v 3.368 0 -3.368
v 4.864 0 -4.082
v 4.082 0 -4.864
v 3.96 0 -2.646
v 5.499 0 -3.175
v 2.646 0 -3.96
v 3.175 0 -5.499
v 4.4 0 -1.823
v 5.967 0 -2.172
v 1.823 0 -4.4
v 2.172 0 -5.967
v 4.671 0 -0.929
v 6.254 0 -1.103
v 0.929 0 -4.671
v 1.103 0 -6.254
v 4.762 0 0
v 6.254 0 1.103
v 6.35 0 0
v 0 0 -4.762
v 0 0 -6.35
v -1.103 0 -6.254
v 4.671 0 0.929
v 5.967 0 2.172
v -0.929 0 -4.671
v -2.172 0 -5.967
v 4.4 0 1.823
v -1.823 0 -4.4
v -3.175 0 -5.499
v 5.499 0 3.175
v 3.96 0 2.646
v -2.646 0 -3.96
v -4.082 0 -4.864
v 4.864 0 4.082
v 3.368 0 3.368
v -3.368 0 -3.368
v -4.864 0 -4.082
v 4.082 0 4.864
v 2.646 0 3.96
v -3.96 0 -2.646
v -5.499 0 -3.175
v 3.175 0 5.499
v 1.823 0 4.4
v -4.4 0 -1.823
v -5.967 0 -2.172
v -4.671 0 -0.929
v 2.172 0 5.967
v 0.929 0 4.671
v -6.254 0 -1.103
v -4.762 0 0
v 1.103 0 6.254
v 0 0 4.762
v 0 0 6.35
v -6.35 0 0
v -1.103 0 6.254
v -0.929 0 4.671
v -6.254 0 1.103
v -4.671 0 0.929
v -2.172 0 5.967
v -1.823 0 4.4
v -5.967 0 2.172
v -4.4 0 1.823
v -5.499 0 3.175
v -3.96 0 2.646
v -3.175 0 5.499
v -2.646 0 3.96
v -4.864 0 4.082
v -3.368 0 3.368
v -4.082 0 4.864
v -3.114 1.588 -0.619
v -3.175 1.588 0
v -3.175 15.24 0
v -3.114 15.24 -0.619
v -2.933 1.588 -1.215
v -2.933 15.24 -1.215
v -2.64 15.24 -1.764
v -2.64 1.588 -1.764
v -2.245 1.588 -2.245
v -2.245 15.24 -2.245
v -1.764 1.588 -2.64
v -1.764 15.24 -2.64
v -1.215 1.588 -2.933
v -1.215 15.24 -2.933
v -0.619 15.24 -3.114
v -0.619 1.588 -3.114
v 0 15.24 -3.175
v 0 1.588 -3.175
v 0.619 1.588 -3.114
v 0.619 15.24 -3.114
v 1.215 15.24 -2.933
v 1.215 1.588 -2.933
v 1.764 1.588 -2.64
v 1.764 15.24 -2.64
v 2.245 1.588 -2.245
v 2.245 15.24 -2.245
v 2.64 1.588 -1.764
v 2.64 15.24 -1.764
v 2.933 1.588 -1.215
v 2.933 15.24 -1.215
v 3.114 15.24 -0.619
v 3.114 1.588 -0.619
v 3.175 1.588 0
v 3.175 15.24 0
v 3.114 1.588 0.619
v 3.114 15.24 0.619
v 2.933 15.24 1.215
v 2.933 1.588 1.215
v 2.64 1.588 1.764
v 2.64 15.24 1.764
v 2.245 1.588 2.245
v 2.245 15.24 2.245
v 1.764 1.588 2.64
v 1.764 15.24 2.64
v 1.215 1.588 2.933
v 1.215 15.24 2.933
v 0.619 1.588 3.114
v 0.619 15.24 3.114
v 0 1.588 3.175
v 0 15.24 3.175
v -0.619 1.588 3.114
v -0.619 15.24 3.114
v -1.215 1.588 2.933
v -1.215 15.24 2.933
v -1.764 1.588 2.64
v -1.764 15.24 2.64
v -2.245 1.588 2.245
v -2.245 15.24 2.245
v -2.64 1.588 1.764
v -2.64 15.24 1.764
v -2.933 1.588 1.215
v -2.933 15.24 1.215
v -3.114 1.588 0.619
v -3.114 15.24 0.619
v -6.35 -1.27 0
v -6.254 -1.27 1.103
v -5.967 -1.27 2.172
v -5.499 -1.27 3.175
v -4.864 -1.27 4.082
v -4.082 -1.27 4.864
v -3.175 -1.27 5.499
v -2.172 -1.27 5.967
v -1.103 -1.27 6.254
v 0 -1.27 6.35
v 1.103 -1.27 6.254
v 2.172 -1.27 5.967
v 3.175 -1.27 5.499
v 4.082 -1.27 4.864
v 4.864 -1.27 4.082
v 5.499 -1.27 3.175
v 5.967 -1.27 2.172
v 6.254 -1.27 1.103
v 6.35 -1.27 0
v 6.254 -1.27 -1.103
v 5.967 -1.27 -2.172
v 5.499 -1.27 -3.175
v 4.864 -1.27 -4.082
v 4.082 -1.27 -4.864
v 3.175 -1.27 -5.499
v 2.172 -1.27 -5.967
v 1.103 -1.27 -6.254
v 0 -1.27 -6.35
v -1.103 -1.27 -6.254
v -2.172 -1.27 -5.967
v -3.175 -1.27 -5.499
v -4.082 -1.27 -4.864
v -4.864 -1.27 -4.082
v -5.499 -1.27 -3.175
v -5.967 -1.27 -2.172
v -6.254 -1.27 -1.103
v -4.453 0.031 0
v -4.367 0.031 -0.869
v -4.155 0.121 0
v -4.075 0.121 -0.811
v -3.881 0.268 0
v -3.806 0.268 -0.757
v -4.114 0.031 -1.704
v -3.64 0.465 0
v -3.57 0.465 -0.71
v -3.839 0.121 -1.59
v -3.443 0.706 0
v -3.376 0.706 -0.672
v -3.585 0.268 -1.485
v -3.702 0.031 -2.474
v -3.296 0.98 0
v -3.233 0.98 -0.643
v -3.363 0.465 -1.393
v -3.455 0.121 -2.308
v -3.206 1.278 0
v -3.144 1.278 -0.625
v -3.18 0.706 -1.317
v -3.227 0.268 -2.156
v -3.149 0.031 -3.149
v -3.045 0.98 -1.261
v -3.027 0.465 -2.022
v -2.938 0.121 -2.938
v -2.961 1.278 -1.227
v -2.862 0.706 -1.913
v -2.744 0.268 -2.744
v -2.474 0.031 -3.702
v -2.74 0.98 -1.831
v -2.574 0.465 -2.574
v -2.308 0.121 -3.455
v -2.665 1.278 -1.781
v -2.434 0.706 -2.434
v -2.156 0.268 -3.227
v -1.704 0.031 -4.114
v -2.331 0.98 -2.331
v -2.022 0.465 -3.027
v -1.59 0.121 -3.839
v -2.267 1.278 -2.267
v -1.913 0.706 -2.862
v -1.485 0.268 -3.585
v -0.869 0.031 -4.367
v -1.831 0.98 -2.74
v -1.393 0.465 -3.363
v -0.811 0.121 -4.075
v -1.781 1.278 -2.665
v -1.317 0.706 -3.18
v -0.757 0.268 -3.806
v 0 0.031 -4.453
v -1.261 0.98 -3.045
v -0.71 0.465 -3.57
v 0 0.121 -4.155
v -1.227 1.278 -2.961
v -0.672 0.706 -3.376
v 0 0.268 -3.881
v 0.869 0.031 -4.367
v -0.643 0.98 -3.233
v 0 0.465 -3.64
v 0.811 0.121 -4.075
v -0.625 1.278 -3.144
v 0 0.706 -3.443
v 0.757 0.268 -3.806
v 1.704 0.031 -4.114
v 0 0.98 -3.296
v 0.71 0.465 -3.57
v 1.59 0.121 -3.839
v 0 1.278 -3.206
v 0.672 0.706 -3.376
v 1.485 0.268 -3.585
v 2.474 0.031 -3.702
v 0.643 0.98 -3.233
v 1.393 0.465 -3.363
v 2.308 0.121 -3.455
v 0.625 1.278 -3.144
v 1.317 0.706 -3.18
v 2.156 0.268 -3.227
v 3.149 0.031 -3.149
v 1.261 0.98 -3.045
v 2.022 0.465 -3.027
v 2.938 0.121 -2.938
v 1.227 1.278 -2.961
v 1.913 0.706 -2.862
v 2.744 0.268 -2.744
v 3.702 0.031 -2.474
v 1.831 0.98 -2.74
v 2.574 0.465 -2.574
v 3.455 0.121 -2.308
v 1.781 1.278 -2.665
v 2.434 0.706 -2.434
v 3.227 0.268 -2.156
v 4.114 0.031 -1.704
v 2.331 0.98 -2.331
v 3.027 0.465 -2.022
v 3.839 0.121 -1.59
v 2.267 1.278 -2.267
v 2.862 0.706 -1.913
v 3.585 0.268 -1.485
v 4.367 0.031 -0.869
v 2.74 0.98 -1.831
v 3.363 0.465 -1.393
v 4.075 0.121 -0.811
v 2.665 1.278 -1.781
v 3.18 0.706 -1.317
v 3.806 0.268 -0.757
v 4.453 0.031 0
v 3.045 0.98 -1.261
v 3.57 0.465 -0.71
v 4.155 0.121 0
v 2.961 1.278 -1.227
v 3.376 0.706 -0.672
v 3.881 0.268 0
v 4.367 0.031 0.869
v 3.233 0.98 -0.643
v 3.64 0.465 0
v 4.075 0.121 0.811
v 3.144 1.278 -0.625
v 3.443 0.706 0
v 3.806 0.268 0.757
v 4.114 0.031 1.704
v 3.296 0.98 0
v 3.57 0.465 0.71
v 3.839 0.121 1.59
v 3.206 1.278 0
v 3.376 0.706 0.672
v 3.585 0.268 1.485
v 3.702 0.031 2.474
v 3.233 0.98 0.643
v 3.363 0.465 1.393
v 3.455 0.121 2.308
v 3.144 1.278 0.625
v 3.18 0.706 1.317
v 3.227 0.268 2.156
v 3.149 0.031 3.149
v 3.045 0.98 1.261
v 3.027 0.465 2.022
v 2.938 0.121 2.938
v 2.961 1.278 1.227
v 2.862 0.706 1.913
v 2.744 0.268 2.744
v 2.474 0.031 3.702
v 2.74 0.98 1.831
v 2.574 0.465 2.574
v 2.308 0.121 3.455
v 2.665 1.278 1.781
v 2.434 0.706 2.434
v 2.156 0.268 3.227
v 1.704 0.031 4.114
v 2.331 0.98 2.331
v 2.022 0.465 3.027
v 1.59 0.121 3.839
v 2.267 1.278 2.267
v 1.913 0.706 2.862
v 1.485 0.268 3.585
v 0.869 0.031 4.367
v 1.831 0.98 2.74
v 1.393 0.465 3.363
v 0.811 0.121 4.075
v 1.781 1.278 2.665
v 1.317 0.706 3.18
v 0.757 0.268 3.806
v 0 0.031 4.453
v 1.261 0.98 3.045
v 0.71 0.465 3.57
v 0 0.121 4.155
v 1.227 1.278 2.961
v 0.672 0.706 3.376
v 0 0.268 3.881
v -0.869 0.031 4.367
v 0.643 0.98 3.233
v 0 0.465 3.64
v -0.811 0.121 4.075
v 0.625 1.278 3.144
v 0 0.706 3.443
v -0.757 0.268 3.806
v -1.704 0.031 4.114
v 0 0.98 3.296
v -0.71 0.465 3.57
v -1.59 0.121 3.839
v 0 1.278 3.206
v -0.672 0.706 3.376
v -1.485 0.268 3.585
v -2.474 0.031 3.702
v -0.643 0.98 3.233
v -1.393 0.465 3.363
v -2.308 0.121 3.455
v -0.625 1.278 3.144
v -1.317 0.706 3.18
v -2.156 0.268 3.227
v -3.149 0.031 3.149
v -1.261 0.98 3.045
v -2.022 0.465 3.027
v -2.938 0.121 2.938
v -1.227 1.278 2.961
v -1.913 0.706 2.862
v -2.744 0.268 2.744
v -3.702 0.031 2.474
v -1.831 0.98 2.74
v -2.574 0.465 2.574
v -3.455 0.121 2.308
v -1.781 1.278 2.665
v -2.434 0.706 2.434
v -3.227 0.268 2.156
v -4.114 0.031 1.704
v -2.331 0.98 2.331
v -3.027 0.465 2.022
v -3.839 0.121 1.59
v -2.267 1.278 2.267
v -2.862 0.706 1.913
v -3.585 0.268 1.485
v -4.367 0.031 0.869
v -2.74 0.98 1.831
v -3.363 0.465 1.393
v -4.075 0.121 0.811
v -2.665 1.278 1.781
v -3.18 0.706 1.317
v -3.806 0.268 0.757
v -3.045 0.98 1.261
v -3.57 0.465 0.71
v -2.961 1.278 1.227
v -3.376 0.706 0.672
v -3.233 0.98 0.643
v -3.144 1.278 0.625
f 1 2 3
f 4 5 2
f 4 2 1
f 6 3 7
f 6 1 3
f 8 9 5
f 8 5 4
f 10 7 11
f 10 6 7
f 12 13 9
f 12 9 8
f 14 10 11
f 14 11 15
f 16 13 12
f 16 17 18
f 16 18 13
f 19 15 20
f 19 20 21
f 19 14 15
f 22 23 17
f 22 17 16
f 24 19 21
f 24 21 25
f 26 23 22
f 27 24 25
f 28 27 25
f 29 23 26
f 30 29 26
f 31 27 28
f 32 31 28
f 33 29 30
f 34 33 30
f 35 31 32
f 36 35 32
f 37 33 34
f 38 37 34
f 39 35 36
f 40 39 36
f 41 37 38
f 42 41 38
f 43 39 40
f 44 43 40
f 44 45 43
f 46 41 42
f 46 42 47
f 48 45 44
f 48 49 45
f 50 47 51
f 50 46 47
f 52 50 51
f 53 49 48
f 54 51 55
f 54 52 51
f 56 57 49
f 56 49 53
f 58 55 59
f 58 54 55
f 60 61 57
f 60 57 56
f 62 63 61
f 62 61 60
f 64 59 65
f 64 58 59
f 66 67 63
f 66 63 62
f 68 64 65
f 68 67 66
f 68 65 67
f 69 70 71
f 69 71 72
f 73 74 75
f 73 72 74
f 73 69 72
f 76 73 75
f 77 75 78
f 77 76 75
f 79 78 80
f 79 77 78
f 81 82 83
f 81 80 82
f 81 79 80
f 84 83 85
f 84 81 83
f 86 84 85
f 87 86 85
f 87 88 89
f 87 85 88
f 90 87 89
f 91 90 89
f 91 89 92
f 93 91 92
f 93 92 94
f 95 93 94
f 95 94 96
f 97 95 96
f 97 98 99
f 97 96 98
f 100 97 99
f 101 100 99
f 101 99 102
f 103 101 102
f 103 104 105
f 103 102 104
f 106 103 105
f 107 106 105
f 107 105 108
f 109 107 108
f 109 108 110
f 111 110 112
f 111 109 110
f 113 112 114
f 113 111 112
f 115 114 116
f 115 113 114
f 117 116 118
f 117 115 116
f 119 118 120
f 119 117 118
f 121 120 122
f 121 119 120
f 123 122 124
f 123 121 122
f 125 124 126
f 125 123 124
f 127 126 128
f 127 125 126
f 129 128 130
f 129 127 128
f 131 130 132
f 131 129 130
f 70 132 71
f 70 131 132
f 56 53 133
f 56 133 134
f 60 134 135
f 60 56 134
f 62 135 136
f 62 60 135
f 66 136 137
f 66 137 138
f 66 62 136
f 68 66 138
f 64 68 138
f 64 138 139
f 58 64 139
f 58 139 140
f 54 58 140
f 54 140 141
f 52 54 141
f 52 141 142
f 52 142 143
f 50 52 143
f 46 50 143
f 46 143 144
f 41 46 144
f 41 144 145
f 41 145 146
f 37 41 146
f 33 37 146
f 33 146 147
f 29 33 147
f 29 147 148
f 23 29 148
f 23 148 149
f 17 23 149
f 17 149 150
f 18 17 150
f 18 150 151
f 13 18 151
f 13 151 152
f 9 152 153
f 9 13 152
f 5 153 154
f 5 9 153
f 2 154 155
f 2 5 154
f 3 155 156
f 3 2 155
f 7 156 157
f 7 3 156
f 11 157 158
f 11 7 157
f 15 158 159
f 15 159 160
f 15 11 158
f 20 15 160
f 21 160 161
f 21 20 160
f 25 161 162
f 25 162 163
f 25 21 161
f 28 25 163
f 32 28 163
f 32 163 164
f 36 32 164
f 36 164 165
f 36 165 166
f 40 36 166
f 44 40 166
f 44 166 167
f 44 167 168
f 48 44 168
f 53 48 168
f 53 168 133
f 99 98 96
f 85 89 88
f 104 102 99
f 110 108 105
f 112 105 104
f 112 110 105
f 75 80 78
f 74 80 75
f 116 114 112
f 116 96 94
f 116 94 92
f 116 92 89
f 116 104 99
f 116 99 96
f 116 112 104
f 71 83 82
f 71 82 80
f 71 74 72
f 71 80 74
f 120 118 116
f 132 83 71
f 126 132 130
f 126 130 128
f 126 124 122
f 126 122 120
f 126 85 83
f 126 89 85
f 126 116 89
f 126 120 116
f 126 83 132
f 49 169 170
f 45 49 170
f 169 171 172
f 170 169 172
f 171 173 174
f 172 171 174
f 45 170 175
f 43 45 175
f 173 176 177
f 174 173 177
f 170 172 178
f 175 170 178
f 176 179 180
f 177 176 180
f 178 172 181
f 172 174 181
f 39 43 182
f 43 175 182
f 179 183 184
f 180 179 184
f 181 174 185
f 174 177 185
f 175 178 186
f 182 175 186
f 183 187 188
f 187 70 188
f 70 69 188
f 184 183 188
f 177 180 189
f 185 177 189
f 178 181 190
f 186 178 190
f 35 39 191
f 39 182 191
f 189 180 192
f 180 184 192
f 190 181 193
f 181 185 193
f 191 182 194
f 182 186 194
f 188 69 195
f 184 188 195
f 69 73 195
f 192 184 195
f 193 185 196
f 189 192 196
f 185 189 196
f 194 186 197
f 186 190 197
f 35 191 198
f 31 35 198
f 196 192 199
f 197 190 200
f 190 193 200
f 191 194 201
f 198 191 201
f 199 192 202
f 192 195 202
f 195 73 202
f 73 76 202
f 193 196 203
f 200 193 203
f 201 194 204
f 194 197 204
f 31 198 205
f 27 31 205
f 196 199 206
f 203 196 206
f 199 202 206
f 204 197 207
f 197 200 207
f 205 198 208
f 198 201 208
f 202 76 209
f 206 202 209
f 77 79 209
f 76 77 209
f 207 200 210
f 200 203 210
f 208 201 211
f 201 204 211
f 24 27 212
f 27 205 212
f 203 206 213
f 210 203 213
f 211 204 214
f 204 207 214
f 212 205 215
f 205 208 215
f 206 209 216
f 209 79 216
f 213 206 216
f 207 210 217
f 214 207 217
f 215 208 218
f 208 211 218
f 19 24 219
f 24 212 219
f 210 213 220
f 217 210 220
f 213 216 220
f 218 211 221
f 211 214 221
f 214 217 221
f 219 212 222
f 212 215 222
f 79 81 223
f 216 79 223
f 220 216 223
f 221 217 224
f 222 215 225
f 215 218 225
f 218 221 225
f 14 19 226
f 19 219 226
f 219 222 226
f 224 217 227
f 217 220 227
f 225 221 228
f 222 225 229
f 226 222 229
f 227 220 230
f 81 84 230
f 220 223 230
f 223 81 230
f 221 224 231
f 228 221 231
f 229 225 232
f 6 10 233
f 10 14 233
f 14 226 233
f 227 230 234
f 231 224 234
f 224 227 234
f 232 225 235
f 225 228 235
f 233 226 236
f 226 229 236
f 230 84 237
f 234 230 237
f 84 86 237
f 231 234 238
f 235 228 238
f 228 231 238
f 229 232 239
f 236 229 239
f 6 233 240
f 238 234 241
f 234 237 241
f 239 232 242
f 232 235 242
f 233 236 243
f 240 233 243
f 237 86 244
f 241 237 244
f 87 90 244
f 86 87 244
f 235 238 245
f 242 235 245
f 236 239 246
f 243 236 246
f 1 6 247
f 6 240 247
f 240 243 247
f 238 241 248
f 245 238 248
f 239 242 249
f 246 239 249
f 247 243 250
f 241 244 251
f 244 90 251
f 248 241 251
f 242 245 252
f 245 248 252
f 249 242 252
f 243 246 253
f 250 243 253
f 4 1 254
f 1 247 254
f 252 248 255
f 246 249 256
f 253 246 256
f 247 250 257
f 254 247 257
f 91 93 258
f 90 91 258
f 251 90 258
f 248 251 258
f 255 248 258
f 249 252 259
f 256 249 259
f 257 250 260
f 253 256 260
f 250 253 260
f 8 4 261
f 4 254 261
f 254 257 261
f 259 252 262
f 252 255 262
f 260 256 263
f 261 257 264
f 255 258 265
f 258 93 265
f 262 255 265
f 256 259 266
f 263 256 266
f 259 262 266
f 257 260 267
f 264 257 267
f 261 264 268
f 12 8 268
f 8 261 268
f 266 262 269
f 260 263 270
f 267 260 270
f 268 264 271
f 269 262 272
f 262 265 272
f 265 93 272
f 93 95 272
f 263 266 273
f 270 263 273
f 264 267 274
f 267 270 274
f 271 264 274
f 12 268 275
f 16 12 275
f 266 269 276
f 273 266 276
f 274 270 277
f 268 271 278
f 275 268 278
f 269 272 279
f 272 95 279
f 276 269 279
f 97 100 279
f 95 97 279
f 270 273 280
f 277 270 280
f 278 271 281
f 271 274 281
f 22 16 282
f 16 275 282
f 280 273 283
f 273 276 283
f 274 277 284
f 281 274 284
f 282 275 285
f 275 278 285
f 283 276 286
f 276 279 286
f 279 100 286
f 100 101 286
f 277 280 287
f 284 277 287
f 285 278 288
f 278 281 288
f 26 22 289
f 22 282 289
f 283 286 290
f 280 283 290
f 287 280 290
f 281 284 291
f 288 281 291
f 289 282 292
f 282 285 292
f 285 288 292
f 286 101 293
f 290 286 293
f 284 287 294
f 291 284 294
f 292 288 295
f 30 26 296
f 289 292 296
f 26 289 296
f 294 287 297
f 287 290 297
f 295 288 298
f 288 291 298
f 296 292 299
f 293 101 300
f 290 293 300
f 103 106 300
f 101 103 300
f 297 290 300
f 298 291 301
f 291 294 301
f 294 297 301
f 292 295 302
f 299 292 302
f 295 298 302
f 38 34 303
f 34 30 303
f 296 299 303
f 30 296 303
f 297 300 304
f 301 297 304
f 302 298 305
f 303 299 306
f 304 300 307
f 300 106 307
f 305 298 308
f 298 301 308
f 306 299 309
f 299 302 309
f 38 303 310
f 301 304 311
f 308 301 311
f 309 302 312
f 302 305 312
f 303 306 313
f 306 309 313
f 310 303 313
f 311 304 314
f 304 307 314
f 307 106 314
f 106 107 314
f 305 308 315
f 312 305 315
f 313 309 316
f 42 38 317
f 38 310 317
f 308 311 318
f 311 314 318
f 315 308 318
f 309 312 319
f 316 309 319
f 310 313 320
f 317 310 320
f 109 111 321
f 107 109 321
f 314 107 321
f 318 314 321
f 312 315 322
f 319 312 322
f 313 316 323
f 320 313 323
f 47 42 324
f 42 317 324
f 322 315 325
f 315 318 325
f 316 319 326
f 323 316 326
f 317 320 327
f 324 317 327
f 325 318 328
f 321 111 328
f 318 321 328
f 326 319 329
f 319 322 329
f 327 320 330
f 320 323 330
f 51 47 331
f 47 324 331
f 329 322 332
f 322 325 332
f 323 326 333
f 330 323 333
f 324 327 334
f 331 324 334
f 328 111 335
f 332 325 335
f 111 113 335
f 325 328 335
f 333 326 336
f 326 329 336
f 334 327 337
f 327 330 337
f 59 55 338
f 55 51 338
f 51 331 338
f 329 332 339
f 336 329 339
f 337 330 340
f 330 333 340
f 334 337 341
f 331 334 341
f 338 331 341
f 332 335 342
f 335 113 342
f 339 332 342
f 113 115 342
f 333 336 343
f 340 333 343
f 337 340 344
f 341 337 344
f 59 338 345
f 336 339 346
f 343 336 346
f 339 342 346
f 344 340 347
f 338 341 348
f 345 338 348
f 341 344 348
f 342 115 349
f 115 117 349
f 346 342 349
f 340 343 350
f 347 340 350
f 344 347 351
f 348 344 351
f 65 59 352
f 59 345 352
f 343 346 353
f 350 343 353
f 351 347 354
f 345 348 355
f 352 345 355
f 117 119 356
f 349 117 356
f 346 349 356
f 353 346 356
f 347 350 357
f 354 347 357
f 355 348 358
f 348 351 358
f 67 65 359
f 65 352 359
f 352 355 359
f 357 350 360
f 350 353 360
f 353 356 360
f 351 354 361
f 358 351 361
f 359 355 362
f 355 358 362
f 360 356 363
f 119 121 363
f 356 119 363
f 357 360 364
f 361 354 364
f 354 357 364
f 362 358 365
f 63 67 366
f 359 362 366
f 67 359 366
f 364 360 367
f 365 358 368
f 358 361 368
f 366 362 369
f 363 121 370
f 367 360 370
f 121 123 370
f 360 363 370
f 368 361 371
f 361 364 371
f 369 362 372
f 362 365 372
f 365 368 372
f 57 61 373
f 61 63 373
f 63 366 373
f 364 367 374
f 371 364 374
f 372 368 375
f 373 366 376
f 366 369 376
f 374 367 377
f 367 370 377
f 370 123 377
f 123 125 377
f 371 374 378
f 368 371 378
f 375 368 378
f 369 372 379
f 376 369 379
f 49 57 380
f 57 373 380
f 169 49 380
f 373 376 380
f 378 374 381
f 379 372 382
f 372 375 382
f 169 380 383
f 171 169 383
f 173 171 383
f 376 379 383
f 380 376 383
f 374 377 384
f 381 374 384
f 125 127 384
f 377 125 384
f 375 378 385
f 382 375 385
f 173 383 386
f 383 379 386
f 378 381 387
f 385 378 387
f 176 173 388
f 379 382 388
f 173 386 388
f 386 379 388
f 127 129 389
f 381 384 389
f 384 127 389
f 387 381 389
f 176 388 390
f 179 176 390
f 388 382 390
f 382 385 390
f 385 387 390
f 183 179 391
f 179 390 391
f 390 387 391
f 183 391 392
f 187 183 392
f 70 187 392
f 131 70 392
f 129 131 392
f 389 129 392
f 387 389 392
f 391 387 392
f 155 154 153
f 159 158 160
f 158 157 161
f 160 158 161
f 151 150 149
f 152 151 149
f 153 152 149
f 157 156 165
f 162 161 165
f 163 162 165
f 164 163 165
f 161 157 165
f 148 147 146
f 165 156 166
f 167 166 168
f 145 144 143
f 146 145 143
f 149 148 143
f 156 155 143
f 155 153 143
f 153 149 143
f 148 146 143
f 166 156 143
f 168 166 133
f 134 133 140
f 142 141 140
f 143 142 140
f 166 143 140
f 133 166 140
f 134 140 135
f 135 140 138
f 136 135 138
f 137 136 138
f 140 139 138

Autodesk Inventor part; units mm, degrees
ref_plane "YZ Plane" through (0, 0, 0) normal (1, 0, 0) x (0, 1, 0)
ref_plane "XZ Plane" through (0, 0, 0) normal (0, 1, 0) x (-1, 0, 0)
ref_plane "XY Plane" through (0, 0, 0) normal (0, 0, 1) x (1, 0, 0)
sketch "Sketch1" plane through (0, 0, 0) normal (0, 1, 0) x (-1, 0, 0)
  circle A0 centre (0, 0) radius 6.35
  circle A1 centre (0, 0) radius 3.175
  dimension "d0" = 12.7
  dimension "d1" = 6.35
extrude "Extrusion1" add sketch "Sketch1" along normal blind 15.24 contours A1
extrude "Extrusion2" add sketch "Sketch1" against normal blind 1.27 contours A0 | A1
fillet "Fillet1" radius 1.5875 1 edges at (3.175, 0, 0)
properties part number "Pin_3DPrint"
